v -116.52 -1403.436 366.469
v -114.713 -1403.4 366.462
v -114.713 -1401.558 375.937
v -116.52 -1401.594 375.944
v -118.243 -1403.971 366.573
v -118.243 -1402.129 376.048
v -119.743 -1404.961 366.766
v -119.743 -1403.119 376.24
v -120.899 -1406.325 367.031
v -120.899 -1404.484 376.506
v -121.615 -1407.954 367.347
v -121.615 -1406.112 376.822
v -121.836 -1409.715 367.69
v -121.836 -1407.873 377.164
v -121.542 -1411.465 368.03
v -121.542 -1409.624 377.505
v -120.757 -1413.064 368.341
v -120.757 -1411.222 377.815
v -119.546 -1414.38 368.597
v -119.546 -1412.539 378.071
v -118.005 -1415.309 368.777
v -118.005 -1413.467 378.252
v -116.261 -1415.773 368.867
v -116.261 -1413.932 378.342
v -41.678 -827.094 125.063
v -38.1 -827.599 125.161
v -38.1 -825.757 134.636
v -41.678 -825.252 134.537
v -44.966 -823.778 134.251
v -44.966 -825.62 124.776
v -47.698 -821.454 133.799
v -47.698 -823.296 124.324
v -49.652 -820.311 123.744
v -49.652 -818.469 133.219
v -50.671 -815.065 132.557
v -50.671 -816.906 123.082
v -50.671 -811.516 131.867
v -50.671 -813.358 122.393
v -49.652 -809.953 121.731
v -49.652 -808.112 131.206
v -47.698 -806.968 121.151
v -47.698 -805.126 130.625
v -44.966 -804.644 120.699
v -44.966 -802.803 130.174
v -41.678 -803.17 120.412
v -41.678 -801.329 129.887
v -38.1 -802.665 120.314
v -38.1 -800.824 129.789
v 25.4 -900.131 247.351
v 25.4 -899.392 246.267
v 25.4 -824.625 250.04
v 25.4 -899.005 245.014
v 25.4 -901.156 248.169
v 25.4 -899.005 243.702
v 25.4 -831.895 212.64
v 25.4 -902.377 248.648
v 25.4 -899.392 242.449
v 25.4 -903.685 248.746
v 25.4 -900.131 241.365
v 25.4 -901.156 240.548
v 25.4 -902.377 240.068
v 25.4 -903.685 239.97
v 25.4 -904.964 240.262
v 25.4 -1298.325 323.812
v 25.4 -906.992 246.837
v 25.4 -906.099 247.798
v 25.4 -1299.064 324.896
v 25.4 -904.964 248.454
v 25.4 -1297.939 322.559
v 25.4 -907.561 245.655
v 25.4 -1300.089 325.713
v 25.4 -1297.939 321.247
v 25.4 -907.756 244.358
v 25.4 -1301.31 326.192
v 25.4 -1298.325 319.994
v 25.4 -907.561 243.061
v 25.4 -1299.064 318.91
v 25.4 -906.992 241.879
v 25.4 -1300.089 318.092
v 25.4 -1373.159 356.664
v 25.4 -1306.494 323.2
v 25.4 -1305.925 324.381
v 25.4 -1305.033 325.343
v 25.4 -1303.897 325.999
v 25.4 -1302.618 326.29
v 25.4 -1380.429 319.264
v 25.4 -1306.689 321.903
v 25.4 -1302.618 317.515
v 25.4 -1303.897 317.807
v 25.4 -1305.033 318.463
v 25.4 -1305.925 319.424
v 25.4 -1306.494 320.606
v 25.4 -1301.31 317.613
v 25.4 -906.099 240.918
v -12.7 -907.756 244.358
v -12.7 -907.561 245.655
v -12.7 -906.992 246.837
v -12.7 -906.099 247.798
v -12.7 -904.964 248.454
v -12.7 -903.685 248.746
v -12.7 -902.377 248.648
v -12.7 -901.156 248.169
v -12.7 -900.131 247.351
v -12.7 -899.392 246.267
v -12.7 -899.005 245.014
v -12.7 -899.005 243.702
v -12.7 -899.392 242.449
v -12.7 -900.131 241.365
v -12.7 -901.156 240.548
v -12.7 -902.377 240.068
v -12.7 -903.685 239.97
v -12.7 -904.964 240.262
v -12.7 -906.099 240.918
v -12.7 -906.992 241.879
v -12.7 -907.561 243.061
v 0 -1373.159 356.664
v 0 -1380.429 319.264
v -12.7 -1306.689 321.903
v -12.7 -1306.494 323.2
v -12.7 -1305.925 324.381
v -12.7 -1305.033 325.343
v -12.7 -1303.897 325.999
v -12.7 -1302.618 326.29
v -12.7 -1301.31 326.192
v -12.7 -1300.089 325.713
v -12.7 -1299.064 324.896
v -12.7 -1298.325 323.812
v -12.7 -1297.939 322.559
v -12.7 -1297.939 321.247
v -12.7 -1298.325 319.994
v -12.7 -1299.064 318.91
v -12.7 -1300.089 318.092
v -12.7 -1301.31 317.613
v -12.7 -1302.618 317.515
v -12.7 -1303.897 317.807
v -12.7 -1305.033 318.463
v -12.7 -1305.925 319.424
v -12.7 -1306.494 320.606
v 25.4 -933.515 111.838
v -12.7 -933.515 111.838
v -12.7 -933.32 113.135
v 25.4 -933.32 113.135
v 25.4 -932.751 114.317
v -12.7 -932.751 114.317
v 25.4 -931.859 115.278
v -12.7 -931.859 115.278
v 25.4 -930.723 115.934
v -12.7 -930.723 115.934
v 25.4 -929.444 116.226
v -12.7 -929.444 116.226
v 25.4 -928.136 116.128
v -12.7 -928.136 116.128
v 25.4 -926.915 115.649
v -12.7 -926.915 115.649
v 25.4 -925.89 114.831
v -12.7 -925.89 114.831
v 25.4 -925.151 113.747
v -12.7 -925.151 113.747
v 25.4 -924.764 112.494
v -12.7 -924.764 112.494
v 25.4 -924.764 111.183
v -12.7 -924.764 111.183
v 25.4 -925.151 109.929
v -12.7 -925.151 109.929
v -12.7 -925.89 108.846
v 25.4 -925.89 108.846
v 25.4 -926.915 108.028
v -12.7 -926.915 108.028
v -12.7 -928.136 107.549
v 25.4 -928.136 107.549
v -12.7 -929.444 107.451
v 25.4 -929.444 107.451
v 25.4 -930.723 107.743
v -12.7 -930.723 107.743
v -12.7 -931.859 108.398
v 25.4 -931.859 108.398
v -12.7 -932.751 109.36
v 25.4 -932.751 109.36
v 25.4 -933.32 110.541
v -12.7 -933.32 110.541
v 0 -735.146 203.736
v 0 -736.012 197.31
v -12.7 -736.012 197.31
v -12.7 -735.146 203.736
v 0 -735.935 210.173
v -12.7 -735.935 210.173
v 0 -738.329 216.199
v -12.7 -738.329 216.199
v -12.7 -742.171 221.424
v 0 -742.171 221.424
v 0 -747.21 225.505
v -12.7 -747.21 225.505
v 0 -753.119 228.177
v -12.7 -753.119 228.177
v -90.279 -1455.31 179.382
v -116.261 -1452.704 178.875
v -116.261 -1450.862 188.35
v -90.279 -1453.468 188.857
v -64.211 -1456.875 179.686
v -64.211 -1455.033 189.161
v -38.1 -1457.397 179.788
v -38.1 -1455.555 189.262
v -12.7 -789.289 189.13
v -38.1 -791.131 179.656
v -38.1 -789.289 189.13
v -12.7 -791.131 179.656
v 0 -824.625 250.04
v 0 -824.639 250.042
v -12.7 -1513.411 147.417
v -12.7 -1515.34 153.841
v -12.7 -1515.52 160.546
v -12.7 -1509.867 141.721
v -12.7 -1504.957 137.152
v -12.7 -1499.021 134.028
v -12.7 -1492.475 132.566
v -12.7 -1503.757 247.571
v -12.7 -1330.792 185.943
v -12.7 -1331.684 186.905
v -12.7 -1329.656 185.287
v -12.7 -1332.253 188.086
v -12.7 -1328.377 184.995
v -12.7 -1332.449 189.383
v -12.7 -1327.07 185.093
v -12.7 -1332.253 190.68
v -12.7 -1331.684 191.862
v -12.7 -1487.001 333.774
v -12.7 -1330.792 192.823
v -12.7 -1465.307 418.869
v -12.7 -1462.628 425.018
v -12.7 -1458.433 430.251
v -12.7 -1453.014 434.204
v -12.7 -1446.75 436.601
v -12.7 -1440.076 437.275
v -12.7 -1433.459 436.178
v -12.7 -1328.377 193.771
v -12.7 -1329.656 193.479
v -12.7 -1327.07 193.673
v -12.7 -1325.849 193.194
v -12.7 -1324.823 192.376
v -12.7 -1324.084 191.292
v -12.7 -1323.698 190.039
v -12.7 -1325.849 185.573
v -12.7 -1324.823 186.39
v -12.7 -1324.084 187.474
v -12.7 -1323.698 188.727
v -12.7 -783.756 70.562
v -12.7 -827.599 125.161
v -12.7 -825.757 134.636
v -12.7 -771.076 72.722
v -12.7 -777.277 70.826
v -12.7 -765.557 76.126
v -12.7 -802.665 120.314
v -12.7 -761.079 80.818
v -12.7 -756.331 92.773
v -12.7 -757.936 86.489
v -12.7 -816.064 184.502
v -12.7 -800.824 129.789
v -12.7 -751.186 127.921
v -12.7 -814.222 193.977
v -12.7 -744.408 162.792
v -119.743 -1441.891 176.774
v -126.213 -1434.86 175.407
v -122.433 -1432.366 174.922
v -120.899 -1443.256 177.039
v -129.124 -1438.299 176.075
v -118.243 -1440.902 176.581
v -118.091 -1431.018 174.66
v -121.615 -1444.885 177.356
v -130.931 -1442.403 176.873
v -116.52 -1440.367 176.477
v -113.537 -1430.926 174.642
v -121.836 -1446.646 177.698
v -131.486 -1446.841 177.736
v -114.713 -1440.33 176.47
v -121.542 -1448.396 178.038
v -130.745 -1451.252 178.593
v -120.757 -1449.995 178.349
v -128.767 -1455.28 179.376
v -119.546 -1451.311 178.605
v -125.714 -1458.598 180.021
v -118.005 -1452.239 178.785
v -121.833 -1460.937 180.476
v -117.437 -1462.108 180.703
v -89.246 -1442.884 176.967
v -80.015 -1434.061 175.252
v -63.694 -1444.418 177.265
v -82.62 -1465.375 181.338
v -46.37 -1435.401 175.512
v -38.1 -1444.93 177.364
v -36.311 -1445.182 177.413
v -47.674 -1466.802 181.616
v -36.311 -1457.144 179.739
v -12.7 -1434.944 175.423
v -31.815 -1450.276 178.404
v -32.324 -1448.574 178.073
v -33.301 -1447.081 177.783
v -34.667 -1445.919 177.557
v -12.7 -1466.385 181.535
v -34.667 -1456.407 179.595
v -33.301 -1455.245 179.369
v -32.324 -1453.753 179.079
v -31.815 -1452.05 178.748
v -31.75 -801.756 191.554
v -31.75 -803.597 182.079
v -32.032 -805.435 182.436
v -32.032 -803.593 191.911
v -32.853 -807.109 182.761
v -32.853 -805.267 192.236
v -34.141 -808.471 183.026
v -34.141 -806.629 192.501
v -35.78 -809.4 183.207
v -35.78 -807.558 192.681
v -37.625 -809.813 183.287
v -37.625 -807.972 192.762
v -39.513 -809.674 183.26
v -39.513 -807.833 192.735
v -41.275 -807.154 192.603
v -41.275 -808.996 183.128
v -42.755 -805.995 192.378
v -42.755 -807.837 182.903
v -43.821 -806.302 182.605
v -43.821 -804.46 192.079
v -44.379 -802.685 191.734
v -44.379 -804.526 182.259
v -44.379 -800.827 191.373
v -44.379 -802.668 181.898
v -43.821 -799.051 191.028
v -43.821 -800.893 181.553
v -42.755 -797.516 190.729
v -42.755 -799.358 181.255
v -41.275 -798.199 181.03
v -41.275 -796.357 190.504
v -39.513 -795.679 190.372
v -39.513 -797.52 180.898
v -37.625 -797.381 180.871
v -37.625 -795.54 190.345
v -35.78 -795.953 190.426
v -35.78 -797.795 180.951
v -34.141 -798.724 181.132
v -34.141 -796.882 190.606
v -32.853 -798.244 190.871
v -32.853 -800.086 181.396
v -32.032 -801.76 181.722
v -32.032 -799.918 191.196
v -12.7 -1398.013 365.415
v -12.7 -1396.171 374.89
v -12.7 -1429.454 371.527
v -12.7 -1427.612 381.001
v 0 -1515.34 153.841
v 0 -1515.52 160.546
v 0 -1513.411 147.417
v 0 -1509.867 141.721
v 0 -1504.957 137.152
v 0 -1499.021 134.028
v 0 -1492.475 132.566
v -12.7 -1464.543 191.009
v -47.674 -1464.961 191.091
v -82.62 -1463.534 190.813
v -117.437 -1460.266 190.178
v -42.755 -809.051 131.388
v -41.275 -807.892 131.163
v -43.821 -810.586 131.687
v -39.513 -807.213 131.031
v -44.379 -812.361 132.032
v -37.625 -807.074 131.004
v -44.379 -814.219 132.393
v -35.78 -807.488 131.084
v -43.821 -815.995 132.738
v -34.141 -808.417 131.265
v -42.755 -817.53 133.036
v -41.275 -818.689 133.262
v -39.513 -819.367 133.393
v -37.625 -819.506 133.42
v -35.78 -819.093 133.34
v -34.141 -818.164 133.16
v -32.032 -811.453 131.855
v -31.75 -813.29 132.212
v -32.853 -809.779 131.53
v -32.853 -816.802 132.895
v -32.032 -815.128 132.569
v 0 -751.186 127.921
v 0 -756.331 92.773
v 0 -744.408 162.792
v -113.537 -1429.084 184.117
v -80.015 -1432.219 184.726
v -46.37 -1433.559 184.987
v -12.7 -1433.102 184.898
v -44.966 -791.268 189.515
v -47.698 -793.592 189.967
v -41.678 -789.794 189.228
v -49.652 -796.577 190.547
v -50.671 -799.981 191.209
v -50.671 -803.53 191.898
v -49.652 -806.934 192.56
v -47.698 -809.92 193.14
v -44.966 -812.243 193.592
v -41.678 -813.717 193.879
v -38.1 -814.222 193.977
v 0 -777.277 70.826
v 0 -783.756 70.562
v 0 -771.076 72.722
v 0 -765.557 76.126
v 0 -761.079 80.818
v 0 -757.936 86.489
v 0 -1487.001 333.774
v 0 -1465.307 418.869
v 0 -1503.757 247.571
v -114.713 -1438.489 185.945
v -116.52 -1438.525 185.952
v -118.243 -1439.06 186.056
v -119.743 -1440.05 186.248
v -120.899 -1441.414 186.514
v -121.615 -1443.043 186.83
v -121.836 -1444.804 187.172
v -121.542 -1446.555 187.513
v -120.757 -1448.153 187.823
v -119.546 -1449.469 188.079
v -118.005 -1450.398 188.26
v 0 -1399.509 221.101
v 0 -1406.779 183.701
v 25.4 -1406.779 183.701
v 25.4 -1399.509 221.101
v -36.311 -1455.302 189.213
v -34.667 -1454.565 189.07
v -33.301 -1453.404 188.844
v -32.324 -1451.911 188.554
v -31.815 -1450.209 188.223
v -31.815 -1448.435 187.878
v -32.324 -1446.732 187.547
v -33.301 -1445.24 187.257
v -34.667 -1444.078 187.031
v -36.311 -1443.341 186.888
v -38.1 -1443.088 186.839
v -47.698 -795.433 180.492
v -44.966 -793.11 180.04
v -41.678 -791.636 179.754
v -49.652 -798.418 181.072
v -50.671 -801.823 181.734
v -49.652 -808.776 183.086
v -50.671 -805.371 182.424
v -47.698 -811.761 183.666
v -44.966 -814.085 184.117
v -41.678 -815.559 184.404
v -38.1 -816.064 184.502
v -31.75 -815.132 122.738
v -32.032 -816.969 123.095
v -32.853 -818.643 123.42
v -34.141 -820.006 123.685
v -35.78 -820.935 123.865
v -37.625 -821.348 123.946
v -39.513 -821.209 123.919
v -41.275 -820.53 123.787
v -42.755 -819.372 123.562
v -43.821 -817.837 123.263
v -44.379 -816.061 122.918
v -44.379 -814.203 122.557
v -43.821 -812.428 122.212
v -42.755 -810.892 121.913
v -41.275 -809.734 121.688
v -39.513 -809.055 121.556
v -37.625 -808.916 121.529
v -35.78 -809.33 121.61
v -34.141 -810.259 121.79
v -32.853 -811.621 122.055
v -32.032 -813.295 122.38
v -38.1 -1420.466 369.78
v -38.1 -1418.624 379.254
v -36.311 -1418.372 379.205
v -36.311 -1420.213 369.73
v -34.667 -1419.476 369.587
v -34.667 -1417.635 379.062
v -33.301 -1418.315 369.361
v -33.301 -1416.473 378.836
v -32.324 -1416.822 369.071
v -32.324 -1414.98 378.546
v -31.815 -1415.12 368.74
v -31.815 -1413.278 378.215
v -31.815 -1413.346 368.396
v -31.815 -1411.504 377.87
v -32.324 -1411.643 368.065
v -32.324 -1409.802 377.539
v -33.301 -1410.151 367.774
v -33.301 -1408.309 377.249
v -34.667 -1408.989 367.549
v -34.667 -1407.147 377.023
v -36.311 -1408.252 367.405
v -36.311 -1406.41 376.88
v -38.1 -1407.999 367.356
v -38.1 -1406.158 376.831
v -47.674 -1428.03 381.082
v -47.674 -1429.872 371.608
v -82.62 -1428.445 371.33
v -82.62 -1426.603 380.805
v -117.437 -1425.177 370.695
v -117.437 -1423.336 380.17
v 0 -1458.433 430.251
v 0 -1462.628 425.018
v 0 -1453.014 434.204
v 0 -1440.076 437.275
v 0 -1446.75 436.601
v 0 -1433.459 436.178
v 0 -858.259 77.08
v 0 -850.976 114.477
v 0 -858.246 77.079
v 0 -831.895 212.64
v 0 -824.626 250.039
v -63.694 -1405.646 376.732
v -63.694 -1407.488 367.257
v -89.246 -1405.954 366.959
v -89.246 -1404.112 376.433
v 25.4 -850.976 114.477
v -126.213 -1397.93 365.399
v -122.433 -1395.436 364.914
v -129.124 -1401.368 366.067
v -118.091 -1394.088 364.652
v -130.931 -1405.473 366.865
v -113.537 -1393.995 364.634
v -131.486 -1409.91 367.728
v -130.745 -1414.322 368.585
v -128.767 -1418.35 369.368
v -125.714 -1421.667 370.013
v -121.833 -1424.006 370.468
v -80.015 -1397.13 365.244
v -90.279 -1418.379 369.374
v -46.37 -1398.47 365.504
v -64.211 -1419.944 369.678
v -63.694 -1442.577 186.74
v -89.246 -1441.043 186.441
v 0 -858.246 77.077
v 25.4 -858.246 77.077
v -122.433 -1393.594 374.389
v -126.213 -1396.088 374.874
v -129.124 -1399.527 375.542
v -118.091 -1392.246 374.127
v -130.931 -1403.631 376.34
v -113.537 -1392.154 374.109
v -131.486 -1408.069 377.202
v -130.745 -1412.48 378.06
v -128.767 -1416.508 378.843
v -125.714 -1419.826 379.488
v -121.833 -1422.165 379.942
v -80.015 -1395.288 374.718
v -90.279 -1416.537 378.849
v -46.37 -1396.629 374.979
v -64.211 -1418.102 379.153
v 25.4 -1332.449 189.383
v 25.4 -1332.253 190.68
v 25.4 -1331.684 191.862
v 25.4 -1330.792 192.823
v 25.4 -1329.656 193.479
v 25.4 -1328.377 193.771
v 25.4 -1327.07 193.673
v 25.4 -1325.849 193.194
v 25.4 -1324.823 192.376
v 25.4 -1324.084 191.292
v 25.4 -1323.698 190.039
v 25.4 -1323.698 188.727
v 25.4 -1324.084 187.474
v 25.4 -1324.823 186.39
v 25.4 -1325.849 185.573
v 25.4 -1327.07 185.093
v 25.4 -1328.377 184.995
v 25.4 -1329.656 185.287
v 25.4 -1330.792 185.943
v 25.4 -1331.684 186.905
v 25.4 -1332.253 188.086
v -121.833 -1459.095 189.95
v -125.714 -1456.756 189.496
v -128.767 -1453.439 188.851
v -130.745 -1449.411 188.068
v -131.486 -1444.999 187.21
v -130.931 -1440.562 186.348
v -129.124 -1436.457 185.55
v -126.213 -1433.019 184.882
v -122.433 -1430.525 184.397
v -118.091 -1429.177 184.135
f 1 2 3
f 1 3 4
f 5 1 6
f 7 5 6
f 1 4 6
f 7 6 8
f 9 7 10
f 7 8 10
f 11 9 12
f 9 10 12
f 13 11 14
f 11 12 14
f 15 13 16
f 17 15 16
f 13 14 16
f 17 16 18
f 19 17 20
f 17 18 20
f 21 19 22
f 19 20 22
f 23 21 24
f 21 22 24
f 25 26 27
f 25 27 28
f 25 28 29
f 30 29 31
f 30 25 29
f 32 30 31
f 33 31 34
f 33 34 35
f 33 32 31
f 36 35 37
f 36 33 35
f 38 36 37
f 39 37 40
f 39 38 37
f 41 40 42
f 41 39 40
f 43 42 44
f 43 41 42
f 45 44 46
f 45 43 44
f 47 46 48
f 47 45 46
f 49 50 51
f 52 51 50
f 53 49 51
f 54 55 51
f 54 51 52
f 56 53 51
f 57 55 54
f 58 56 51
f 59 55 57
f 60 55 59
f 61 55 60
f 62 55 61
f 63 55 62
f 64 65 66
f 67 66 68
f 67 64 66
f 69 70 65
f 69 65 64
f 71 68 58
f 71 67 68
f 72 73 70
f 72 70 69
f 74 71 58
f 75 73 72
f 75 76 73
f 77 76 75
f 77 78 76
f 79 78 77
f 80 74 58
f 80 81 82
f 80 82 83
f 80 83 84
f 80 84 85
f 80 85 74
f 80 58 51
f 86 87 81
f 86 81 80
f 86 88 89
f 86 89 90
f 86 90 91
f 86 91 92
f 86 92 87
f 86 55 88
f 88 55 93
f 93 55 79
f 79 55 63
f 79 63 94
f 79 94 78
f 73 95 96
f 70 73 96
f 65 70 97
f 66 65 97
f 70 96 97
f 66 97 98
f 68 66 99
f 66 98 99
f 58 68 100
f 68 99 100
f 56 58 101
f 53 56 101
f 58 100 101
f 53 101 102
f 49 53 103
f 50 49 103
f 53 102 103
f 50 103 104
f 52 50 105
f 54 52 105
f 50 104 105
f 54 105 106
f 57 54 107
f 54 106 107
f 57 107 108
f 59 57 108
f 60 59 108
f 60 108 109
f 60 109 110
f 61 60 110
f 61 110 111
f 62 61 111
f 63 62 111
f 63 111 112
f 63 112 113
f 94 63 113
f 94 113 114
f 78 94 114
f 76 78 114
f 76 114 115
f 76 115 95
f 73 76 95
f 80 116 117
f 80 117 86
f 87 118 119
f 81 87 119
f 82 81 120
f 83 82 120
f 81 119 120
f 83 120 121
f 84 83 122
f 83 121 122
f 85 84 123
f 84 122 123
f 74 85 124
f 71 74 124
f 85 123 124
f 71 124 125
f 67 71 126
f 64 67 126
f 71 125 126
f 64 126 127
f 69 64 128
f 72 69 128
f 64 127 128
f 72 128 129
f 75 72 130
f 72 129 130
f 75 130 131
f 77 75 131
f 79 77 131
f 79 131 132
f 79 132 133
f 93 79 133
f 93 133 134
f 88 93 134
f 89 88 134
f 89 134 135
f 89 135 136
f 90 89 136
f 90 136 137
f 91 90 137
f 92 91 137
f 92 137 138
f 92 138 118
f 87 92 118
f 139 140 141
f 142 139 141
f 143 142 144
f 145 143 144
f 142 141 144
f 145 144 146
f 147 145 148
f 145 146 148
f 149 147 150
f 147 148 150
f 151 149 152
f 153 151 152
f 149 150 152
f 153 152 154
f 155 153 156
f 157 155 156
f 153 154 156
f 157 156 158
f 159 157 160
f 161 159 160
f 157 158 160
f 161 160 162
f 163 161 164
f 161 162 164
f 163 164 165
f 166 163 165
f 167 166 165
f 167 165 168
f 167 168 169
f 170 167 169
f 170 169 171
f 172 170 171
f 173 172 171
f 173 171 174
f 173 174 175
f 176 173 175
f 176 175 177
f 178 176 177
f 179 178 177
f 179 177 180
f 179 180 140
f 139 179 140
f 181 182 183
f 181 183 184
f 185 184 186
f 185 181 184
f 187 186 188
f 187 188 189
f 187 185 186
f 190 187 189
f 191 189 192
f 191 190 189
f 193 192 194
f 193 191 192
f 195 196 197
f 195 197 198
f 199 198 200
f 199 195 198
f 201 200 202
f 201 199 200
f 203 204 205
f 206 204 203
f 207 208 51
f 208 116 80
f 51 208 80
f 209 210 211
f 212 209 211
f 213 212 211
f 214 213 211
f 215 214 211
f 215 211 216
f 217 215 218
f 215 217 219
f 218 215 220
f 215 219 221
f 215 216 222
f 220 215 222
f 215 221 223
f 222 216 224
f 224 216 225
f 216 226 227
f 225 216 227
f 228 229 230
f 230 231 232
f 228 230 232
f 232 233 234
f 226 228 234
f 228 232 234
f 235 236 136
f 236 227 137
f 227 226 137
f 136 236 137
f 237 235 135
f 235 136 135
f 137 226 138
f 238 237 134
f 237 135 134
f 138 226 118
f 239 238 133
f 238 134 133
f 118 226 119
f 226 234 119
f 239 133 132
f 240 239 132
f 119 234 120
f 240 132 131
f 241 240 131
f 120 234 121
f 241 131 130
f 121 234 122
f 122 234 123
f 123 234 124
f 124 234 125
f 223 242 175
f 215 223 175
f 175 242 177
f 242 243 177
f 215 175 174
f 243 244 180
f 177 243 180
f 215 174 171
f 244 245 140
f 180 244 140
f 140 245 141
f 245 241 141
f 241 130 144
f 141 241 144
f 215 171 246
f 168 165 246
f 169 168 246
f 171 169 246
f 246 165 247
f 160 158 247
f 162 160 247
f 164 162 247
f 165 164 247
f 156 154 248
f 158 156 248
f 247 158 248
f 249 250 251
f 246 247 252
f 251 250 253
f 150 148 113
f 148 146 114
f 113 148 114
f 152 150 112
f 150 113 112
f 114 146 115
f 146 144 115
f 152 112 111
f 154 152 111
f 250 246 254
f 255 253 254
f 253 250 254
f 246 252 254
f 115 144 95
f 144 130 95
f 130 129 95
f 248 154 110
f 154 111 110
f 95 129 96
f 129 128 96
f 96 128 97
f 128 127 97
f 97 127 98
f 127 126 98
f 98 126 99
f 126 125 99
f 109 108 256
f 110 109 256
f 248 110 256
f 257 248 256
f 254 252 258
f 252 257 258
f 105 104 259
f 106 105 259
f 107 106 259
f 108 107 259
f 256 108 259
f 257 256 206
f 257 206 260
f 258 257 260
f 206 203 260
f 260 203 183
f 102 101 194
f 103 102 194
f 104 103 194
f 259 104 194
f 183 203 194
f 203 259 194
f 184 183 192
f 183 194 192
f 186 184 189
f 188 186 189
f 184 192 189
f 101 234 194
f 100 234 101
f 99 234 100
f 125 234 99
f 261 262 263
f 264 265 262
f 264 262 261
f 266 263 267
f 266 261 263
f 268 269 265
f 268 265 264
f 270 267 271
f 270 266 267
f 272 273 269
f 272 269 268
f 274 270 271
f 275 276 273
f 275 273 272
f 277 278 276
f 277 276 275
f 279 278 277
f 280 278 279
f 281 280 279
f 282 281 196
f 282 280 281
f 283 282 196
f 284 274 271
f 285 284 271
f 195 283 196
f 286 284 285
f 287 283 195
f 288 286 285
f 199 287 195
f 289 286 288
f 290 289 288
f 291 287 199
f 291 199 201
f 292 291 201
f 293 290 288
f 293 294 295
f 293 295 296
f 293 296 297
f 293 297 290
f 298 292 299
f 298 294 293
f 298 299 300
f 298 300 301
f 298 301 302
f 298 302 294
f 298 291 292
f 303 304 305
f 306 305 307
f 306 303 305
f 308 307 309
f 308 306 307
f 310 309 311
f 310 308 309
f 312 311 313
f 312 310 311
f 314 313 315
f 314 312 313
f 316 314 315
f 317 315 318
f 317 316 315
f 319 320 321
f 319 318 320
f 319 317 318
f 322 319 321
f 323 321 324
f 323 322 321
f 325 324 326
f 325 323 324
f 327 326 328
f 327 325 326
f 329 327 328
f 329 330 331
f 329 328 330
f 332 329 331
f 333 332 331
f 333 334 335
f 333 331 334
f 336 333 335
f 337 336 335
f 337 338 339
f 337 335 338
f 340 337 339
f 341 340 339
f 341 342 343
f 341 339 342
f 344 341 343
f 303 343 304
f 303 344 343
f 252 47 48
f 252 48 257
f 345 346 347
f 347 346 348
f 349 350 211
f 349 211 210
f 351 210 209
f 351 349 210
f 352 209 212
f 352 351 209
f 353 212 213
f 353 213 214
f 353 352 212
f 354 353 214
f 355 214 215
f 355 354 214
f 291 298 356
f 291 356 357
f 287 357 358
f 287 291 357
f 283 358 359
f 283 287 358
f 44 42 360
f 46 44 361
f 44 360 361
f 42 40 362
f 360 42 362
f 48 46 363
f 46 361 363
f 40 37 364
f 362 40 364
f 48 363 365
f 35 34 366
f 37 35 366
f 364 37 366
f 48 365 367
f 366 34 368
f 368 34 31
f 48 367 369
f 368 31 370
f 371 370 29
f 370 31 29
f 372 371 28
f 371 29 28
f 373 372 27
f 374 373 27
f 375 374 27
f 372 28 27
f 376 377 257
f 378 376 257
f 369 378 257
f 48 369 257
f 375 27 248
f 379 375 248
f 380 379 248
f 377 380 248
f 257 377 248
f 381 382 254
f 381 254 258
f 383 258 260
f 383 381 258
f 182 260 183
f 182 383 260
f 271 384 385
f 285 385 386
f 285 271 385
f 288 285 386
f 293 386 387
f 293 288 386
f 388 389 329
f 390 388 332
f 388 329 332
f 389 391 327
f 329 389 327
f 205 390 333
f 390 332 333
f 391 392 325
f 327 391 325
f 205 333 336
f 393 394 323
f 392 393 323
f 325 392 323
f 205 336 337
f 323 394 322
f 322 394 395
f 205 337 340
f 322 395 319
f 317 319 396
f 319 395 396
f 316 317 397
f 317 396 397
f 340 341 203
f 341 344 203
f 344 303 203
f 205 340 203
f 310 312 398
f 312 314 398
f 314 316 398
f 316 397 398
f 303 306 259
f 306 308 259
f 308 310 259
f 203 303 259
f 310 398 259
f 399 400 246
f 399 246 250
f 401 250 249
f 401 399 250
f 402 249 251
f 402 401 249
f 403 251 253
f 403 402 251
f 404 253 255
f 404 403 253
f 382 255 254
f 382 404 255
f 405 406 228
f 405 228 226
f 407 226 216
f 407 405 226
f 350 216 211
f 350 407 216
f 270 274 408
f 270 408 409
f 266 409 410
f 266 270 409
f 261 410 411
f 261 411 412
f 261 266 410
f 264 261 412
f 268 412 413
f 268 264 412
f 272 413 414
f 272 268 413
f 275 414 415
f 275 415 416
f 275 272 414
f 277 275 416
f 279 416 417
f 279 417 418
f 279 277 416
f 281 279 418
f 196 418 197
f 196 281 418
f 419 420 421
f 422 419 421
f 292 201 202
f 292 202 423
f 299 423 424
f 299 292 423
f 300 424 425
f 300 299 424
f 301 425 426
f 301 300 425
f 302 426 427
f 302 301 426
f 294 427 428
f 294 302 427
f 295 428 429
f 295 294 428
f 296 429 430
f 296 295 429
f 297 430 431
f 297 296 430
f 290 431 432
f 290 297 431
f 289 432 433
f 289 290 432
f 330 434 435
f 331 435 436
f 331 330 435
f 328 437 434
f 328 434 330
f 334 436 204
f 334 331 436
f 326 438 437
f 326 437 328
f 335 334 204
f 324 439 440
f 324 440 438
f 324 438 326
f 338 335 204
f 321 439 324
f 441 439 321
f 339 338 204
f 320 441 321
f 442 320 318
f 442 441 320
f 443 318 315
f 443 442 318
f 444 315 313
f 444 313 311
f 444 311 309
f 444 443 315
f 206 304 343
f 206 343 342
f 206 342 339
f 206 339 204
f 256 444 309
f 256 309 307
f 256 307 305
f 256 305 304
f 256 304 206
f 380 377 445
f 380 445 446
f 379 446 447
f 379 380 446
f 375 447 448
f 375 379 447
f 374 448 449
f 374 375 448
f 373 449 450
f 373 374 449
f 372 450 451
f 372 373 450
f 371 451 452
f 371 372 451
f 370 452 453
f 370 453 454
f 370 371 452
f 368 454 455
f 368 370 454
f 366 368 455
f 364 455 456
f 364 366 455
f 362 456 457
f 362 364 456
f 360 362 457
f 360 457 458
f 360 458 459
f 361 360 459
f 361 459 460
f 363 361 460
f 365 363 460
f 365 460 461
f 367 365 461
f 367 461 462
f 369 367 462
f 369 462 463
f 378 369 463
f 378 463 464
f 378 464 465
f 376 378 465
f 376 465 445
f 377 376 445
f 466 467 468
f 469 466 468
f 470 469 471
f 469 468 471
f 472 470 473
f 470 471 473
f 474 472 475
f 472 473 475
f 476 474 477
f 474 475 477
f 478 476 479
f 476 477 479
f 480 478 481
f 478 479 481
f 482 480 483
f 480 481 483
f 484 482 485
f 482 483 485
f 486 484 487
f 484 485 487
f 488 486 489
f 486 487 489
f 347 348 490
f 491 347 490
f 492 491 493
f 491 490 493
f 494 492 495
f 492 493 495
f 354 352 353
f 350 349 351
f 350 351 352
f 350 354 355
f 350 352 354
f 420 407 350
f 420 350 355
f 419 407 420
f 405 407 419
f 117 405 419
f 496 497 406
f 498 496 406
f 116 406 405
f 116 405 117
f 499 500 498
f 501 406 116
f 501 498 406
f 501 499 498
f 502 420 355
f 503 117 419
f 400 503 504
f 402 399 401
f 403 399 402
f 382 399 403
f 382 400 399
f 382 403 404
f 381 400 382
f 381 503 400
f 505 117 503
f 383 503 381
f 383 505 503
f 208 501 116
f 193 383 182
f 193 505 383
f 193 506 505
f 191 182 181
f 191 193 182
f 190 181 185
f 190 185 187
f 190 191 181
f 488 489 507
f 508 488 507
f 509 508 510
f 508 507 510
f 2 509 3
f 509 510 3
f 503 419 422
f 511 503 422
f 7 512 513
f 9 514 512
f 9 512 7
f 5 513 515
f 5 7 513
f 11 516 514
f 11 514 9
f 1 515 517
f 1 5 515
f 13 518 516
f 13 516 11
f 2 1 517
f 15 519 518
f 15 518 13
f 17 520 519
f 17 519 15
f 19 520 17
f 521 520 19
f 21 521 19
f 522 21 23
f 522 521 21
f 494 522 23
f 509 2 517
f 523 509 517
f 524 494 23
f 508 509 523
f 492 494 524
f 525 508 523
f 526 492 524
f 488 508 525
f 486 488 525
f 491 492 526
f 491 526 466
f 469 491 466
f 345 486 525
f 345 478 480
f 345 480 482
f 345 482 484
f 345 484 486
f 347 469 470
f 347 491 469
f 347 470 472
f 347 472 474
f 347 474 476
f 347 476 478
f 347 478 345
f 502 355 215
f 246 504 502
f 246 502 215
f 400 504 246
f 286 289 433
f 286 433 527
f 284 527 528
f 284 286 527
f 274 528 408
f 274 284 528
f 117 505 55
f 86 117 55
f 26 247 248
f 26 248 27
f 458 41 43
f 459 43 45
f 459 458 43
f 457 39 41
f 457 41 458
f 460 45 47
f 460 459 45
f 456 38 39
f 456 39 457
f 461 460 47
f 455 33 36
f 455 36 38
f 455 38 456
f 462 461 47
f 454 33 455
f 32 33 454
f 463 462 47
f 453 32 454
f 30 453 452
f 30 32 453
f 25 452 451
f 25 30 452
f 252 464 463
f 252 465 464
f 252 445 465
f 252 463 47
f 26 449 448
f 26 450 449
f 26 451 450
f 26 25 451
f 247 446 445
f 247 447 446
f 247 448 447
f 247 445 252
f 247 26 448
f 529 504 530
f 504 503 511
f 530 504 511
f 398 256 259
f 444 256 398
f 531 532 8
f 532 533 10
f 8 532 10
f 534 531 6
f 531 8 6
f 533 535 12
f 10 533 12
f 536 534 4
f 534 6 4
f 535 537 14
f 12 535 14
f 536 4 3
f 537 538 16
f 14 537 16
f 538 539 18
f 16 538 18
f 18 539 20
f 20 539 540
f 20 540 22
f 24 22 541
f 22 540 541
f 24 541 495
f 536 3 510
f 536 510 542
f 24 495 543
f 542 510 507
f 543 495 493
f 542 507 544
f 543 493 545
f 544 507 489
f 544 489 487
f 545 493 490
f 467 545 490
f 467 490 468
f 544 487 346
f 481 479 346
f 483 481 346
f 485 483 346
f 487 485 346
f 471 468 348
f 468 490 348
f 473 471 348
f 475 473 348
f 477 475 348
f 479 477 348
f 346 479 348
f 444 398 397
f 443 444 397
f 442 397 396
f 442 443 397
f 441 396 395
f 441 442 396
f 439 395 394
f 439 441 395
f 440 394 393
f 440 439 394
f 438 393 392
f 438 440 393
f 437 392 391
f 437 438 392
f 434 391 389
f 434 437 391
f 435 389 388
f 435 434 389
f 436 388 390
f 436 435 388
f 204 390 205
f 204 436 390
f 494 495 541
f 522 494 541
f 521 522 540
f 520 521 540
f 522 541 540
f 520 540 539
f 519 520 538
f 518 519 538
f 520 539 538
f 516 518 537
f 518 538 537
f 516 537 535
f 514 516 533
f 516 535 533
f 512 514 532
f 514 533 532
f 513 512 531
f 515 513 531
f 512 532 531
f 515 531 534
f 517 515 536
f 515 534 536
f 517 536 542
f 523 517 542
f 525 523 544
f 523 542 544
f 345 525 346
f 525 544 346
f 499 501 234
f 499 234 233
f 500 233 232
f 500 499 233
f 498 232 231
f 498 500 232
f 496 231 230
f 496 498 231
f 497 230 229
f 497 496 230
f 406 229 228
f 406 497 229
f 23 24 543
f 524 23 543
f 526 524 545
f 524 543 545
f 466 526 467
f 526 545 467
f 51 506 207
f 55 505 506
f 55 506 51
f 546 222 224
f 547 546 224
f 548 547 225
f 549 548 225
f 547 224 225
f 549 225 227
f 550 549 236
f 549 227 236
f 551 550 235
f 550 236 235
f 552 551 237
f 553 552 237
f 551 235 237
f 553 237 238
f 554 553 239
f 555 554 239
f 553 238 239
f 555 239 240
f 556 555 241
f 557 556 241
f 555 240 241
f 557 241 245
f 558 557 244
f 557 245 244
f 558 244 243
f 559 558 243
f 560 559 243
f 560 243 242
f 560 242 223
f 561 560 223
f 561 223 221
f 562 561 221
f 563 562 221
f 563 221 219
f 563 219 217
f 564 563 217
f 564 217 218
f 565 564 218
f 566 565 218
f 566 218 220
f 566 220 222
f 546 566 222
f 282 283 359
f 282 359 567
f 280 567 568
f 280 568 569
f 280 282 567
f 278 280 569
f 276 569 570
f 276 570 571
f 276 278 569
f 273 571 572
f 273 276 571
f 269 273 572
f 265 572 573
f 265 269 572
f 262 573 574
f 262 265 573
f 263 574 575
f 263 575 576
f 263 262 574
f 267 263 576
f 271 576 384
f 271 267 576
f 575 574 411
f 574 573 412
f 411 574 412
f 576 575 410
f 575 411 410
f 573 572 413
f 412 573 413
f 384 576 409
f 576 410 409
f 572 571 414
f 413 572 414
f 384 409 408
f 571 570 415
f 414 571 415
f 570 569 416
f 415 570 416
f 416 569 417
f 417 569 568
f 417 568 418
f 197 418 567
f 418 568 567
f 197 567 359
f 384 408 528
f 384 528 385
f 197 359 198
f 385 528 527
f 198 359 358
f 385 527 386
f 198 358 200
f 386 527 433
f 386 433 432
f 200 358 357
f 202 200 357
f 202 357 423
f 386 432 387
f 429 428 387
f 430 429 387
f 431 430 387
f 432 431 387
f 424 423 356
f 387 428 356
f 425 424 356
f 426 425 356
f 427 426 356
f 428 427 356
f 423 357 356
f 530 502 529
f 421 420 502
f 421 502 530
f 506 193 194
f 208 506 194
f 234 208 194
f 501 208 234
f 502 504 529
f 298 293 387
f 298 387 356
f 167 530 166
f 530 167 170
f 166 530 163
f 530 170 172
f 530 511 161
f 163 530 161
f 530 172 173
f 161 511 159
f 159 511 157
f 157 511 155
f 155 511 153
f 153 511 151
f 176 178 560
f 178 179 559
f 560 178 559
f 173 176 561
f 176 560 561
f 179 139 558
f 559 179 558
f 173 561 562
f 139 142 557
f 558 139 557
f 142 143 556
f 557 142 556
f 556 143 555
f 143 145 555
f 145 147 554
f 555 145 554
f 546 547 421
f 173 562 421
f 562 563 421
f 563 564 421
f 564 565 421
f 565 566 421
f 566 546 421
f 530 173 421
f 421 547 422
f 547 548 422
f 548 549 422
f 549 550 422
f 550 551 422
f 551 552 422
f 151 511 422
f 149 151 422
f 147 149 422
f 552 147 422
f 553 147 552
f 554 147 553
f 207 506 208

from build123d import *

# Parameters (mm, degrees)
F1_DEPTH  = 12.7
F4_DEPTH  = 25.4
F7_DEPTH  = 9.652
F10_DEPTH = 9.652
F11_R     = 6.35
F12_DEPTH = 25.4
F13_W     = 63.8140652657
F13_H     = 50.8
F14_DEPTH = 101.1923770612
F17_W     = 25.4
F17_H     = 558.8000023101
F18_DEPTH = 38.1
F21_D     = 8.8


# Not quite as in the source:
# - a feature of the source that left no trace in its solid (it failed there, or was rolled back) is left out
# - a pattern or mirror of a feature is missing from the dataset's text; its kind, count and spacing are read off the source's solid


with BuildPart() as f1:
    # F0 (on Right) → F1 (new body)
    with BuildSketch(Plane.YZ):
        with BuildLine():
            ThreePointArc((-756.3314490517, 92.7725130381), (-747.9999137871, 145.3964544769), (-736.0115033336, 197.3095713861))
            ThreePointArc((-736.0115033336, 197.3095713861), (-738.3291312366, 216.1993713631), (-753.1189788115, 228.1766979004))
            Line((-753.1189788115, 228.1766979004), (-1433.4591504296, 436.1775621929))
            ThreePointArc((-1433.4591504296, 436.1775621929), (-1453.0143855451, 434.2043994356), (-1465.30717803, 418.8685641269))
            ThreePointArc((-1465.30717803, 418.8685641269), (-1495.9998275742, 290.7929089539), (-1515.5200833468, 160.5455604257))
            ThreePointArc((-1515.5200833468, 160.5455604257), (-1509.8673096495, 141.7214604148), (-1492.4751711568, 132.5664557537))
            Line((-1492.4751711568, 132.5664557537), (-783.7562532192, 70.5615848078))
            ThreePointArc((-783.7562532192, 70.5615848078), (-765.5565598439, 76.1263941769), (-756.3314490517, 92.7725130381))
        make_face()
        with BuildLine():
            ThreePointArc((-868.3901696878, 137.4879790683), (-863.196533516, 167.7279226013), (-856.9770599652, 197.7736575783))
            ThreePointArc((-856.9770599652, 197.7736575783), (-841.8007632153, 207.3788653824), (-832.1955554113, 192.2025686325))
            ThreePointArc((-832.1955554113, 192.2025686325), (-838.239832524, 163.0031923871), (-843.2871690853, 133.6150782495))
            ThreePointArc((-843.2871690853, 133.6150782495), (-857.775119796, 123.0000283577), (-868.3901696878, 137.4879790683))
        make_face(mode=Mode.SUBTRACT)
        with BuildLine():
            ThreePointArc((-1392.344253737, 220.5256653672), (-1383.7998405062, 268.9834407823), (-1373.5694803277, 317.1135013085))
            ThreePointArc((-1373.5694803277, 317.1135013085), (-1358.3381021148, 326.6311227412), (-1348.8204806822, 311.3997445282))
            ThreePointArc((-1348.8204806822, 311.3997445282), (-1358.8665100466, 264.1368922998), (-1367.2569698858, 216.5522299552))
            ThreePointArc((-1367.2569698858, 216.5522299552), (-1381.7873295174, 205.9953057356), (-1392.344253737, 220.5256653672))
        make_face(mode=Mode.SUBTRACT)
        with BuildLine():
            ThreePointArc((-1348.8204806822, 311.3997445282), (-1358.3381021148, 326.6311227412), (-1373.5694803277, 317.1135013085))
            ThreePointArc((-1373.5694803277, 317.1135013085), (-1383.7998405062, 268.9834407823), (-1392.344253737, 220.5256653672))
            ThreePointArc((-1392.344253737, 220.5256653672), (-1381.7873295174, 205.9953057356), (-1367.2569698858, 216.5522299552))
            ThreePointArc((-1367.2569698858, 216.5522299552), (-1358.8665100466, 264.1368922998), (-1348.8204806822, 311.3997445282))
        make_face()
        with BuildLine():
            ThreePointArc((-832.1955554113, 192.2025686325), (-841.8007632153, 207.3788653824), (-856.9770599652, 197.7736575783))
            ThreePointArc((-856.9770599652, 197.7736575783), (-863.196533516, 167.7279226013), (-868.3901696878, 137.4879790683))
            ThreePointArc((-868.3901696878, 137.4879790683), (-857.775119796, 123.0000283577), (-843.2871690853, 133.6150782495))
            ThreePointArc((-843.2871690853, 133.6150782495), (-838.239832524, 163.0031923871), (-832.1955554113, 192.2025686325))
        make_face()
    extrude(amount=-F1_DEPTH)

    # F3 (on face) → F4 (join, symmetric)
    with BuildSketch(Plane(origin=(0, 0, 0), x_dir=(1, 0, 0), z_dir=(0, -0.1908089954, -0.9816271834))):
        with BuildLine():
            ThreePointArc((-38.1, 829.9252514334), (-33.6098719395, 828.0653794939), (-31.75, 823.5752514334))
            ThreePointArc((-31.75, 823.5752514334), (-33.6098719395, 819.0851233729), (-38.1, 817.2252514334))
            Line((-38.1, 817.2252514334), (-38.1, 810.8752514334))
            ThreePointArc((-38.1, 810.8752514334), (-29.1197438789, 814.5949953123), (-25.4, 823.5752514334))
            ThreePointArc((-25.4, 823.5752514334), (-29.1197438789, 832.5555075545), (-38.1, 836.2752514334))
            Line((-38.1, 836.2752514334), (-38.1, 829.9252514334))
        make_face()
        with BuildLine():
            ThreePointArc((-38.1, 817.2252514334), (-44.45, 823.5752514334), (-38.1, 829.9252514334))
            Line((-38.1, 829.9252514334), (-38.1, 836.2752514334))
            ThreePointArc((-38.1, 836.2752514334), (-50.8, 823.5752514334), (-38.1, 810.8752514334))
            Line((-38.1, 810.8752514334), (-38.1, 817.2252514334))
        make_face()
        with BuildLine():
            Line((-12.7, 836.2752514334), (-38.1, 836.2752514334))
            ThreePointArc((-38.1, 836.2752514334), (-29.1197438789, 832.5555075545), (-25.4, 823.5752514334))
            ThreePointArc((-25.4, 823.5752514334), (-29.1197438789, 814.5949953123), (-38.1, 810.8752514334))
            Line((-38.1, 810.8752514334), (-12.7, 810.8752514334))
            Line((-12.7, 810.8752514334), (-12.7, 836.2752514334))
        make_face()
    extrude(amount=F4_DEPTH, both=True)

    # F9 (on face) → F10 (join)
    with BuildSketch(Plane(origin=(0, -4.8465484826, -24.9333304596), x_dir=(1, 0, 0), z_dir=(0, -0.1908089954, -0.9816271834))):
        with BuildLine():
            Line((-12.7, 810.8752514334), (-12.7, 836.2752514334))
            Line((-12.7, 836.2752514334), (-38.1, 836.2752514334))
            ThreePointArc((-38.1, 836.2752514334), (-50.8, 823.5752514334), (-38.1, 810.8752514334))
            Line((-38.1, 810.8752514334), (-12.7, 810.8752514334))
        make_face()
    f10 = extrude(amount=F10_DEPTH)

    # F10_copies: F10 across plane
    add(f10.mirror(Plane(origin=(0, 0, 0), x_dir=(0, 0.9816271834, -0.1908089954), z_dir=(0, 0.1908089954, 0.9816271834))))

    # F11 (on face) → F12 (cut)
    with BuildSketch(Plane(origin=(0, -6.6882369059, -34.4079960342), x_dir=(1, 0, 0), z_dir=(0, -0.1908089954, -0.9816271834))):
        with Locations((-38.1, 823.5752514334)):
            Circle(F11_R)
    f12 = extrude(amount=-F12_DEPTH, mode=Mode.SUBTRACT)

    # F12_copies: F12 across plane
    add(f12.mirror(Plane(origin=(0, 0, 0), x_dir=(0, 0.9816271834, -0.1908089954), z_dir=(0, 0.1908089954, 0.9816271834))), mode=Mode.SUBTRACT)

    # F13 (on face) → F14 (cut, through all)
    with BuildSketch(Plane(origin=(0, -820.9105196516, 159.5688405843), x_dir=(1, 0, 0), z_dir=(0, -0.9816271834, 0.1908089954))):
        with Locations((-44.6070326328, 0)):
            Rectangle(F13_W, F13_H)
    extrude(amount=-F14_DEPTH, mode=Mode.SUBTRACT)

    # F17 (on face) → F18 (join)
    with BuildSketch(Plane(origin=(0, -9.5404497688, -49.0813591724), x_dir=(1, 0, 0), z_dir=(0, -0.1908089954, -0.9816271834))):
        with Locations((12.7, 1136.5846496688)):
            Rectangle(F17_W, F17_H)
    f18 = extrude(amount=F18_DEPTH)

    # F18_copies: F18 across plane
    add(f18.mirror(Plane(origin=(0, 0, 0), x_dir=(0, 0.9816271834, -0.1908089954), z_dir=(0, 0.1908089954, 0.9816271834))))

    # F21 (through all)
    with Locations(Plane.YZ.offset(25.4)):
        with Locations((-929.1153519156, 111.8383524205), (-1328.0486392687, 189.3831281415), (-1302.2894248929, 321.9027979069), (-903.3561375398, 244.3580221859)):
            Hole(F21_D / 2)


with BuildPart() as f7:
    # F6 (on face) → F7 (new body)
    with BuildSketch(Plane(origin=(0, -19.3861939303, -99.7333218383), x_dir=(1, 0, 0), z_dir=(0, -0.1908089954, -0.9816271834))):
        with BuildLine():
            Line((-12.7, 1458.0670480707), (-12.7, 1474.0815496381))
            ThreePointArc((-12.7, 1474.0815496381), (-65.1564294406, 1474.0147594815), (-117.4371862954, 1469.7247812442))
            ThreePointArc((-117.4371862954, 1469.7247812442), (-131.3697565808, 1451.8919044925), (-113.5368798291, 1437.9593342071))
            ThreePointArc((-113.5368798291, 1437.9593342071), (-63.2019841466, 1442.064066527), (-12.7, 1442.0518993386))
            Line((-12.7, 1442.0518993386), (-12.7, 1458.0670480707))
        make_face()
        with BuildLine():
            ThreePointArc((-38.1, 1464.9252514334), (-31.75, 1458.5752514334), (-38.1, 1452.2252514334))
            ThreePointArc((-38.1, 1452.2252514334), (-76.4781643786, 1451.0526924613), (-114.7131627316, 1447.5393896627))
            ThreePointArc((-114.7131627316, 1447.5393896627), (-121.7897011252, 1453.068187395), (-116.2609033929, 1460.1447257886))
            ThreePointArc((-116.2609033929, 1460.1447257886), (-77.2534808307, 1463.7290044013), (-38.1, 1464.9252514334))
        make_face(mode=Mode.SUBTRACT)
    extrude(amount=-F7_DEPTH)


with BuildPart() as f7_copies_1:
    # F7_copies: instance of F7
    add(f7.part.mirror(Plane(origin=(0, 0, 0), x_dir=(0, 0.9816271834, -0.1908089954), z_dir=(0, 0.1908089954, 0.9816271834))))


solid = Compound([f1.part, f7.part, f7_copies_1.part])
